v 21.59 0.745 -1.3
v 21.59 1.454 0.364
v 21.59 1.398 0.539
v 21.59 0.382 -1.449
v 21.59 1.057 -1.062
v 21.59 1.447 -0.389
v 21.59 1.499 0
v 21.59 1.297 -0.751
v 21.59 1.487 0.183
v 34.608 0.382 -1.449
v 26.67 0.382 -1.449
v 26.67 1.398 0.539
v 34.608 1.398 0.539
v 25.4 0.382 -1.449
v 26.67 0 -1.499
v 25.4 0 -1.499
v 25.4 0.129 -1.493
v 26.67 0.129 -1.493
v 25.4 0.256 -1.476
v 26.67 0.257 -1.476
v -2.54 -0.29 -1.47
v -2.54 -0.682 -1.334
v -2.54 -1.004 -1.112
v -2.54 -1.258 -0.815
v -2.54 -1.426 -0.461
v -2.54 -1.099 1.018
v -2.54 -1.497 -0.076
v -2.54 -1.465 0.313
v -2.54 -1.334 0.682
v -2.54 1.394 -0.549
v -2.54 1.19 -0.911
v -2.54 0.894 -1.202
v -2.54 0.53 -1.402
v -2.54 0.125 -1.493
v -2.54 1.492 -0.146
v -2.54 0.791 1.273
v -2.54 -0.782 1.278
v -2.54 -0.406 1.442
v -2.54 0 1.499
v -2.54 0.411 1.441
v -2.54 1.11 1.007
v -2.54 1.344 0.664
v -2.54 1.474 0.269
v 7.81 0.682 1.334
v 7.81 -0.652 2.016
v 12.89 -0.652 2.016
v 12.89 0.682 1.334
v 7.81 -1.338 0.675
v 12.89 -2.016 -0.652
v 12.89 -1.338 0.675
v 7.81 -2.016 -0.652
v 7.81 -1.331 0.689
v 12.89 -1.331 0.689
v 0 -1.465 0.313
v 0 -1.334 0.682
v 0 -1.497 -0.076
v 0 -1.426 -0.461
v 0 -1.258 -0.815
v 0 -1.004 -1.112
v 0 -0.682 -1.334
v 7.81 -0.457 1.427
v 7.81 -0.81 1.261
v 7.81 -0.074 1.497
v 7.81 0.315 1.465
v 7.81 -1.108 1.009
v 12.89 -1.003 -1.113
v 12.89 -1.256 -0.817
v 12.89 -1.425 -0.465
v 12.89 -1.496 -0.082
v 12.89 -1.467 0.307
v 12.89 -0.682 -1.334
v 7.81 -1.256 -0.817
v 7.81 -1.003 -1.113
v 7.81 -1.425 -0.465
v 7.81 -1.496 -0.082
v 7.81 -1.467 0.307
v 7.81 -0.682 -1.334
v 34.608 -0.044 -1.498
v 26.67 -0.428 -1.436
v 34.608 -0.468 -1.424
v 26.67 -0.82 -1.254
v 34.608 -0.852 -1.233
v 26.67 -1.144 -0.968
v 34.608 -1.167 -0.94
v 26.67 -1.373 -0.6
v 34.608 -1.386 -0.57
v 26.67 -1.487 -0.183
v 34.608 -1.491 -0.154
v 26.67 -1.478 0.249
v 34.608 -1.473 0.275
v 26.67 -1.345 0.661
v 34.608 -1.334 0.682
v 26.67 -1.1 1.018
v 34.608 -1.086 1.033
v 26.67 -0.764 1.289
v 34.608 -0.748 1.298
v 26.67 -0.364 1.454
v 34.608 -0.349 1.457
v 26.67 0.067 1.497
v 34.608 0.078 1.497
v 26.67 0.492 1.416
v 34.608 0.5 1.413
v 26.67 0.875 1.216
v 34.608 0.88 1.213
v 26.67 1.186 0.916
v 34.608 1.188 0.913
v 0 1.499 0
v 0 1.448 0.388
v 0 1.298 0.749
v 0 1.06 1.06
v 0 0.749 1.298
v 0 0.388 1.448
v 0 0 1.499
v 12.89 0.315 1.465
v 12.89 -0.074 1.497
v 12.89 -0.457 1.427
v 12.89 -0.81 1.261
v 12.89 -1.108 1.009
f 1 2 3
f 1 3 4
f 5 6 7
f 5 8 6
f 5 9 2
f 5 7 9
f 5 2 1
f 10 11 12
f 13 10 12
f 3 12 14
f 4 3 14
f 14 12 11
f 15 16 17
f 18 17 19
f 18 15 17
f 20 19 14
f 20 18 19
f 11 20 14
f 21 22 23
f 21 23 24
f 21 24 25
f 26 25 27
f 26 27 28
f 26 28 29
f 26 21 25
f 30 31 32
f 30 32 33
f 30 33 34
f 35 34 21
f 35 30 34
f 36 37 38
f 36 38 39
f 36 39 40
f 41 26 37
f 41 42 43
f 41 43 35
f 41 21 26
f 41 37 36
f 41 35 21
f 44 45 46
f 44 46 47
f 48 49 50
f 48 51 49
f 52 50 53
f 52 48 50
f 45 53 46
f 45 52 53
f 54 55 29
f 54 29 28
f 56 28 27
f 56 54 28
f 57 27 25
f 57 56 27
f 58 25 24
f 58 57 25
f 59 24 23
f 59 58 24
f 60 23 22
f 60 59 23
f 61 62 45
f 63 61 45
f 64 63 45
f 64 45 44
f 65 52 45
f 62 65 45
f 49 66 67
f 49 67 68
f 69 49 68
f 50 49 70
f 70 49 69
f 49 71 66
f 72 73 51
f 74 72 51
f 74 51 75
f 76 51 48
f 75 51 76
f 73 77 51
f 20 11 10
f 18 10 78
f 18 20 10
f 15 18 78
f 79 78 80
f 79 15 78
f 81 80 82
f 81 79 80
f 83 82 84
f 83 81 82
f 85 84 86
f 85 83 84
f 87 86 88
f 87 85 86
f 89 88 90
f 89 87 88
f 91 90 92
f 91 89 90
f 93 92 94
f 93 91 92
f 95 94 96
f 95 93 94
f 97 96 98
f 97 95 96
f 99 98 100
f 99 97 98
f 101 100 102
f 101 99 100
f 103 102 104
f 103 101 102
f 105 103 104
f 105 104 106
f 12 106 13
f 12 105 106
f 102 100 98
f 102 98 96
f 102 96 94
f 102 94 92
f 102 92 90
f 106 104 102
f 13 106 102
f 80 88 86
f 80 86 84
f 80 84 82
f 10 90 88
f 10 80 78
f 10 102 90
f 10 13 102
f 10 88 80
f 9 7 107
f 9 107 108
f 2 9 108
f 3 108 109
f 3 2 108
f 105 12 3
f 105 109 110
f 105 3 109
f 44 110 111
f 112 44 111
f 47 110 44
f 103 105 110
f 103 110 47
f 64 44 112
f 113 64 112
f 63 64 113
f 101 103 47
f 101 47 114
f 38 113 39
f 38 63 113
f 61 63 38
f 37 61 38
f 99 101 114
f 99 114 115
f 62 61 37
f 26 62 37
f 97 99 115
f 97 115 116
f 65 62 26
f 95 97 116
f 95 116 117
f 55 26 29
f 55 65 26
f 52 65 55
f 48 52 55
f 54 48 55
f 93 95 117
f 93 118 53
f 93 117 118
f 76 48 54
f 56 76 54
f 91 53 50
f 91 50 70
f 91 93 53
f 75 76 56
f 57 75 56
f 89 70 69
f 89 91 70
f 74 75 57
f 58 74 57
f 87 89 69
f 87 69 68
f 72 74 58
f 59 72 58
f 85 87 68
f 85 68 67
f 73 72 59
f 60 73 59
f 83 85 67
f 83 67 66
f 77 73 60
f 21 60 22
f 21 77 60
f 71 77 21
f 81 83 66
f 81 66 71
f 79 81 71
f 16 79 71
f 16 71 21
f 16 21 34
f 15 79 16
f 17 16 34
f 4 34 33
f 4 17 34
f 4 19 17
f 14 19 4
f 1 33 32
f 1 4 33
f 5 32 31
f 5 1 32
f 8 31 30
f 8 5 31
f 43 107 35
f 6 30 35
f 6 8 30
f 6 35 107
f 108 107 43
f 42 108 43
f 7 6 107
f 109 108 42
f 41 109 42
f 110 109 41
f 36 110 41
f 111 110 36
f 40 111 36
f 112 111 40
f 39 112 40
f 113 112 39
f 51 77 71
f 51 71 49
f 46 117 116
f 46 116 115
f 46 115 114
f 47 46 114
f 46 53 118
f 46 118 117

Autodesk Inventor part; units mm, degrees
ref_plane "YZ Plane" through (0, 0, 0) normal (1, 0, 0) x (0, 1, 0)
ref_plane "XZ Plane" through (0, 0, 0) normal (0, 1, 0) x (-1, 0, 0)
ref_plane "XY Plane" through (0, 0, 0) normal (0, 0, 1) x (1, 0, 0)
sketch "Sketch1" plane through (0, 0, 0) normal (1, 0, 0) x (0, 1, 0)
  circle A0 centre (0, 0) radius 1.4986
  dimension "d0" = 2.9972
extrude "Extrusion1" add sketch "Sketch1" along normal blind 25.4
ref_plane "Work Plane1" through (7.81, -18.8269, 9.6237) normal (1, 0, 0) x (0, 0.4551504, 0.8904146)
sketch "Sketch2" plane through (7.81, -18.8269, 9.6237) normal (1, 0, 0) x (0, 0.4551504, 0.8904146)
  line L0 (0, -21.144) -> (-1.4986, -21.144) construction
  circle A0 centre (0, -21.144) radius 1.4986 construction
  line L1 (-1.4986, -21.144) -> (-1.4986, -19.6454)
  line L2 (-1.4986, -19.6454) -> (1.4986, -19.6454)
  line L3 (1.4986, -19.6454) -> (1.4986, -21.144)
  line L4 (-1.4986, -21.144) -> (1.4986, -21.144)
extrude "Extrusion2" add sketch "Sketch2" along normal blind 5.08
sketch "Sketch3" plane through (25.4, 0, 0) normal (1, 0, 0) x (0, 0, -1)
  circle A0 centre (0, 0) radius 1.4986
extrude "Extrusion3" add sketch "Sketch3" along normal blind 1.27
sketch "Sketch4" plane through (26.67, 0, 0) normal (1, 0, 0) x (0, 0, -1)
  line L0 (-0.5404, 1.3993) -> (1.4507, 0.3815)
  arc A0 (-10.1641, -17.4276) -> (-8.173, -18.4454) centre (-9.6237, -18.8269) ccw
  line L1 (-10.1641, -17.4276) -> (-8.173, -18.4454) projected
  line L2 (-2.0165, -0.6523) -> (-0.6821, -1.3344) projected
  arc A1 (1.4507, 0.3815) -> (-0.5404, 1.3993) centre (0, 0) ccw
extrude "Extrusion4" cut sketch "Sketch4" against normal blind 5.08 contours A1 L0
sketch "Sketch5" plane through (26.67, 0, 0) normal (1, 0, 0) x (0, 0, -1)
  line L0 (1.449, 0.3824) -> (-0.5387, 1.3984) projected
  line L1 (1.449, 0.3824) -> (-0.5387, 1.3984) projected
  arc A0 (-0.5387, 1.3984) -> (1.449, 0.3824) centre (0, 0) ccw projected
extrude "Extrusion5" add sketch "Sketch5" along normal blind 7.9375
sketch "Sketch6" plane through (0, 0, 0) normal (-1, 0, 0) x (0, 0, 1)
  arc A0 (-1.3344, -0.6821) -> (0.6821, -1.3344) centre (0, 0) ccw projected
  circle A1 centre (0, 0) radius 1.4986
extrude "Extrusion6" add sketch "Sketch6" along normal blind 2.54
properties part number "Shaft" material "PAEK Plastic"
